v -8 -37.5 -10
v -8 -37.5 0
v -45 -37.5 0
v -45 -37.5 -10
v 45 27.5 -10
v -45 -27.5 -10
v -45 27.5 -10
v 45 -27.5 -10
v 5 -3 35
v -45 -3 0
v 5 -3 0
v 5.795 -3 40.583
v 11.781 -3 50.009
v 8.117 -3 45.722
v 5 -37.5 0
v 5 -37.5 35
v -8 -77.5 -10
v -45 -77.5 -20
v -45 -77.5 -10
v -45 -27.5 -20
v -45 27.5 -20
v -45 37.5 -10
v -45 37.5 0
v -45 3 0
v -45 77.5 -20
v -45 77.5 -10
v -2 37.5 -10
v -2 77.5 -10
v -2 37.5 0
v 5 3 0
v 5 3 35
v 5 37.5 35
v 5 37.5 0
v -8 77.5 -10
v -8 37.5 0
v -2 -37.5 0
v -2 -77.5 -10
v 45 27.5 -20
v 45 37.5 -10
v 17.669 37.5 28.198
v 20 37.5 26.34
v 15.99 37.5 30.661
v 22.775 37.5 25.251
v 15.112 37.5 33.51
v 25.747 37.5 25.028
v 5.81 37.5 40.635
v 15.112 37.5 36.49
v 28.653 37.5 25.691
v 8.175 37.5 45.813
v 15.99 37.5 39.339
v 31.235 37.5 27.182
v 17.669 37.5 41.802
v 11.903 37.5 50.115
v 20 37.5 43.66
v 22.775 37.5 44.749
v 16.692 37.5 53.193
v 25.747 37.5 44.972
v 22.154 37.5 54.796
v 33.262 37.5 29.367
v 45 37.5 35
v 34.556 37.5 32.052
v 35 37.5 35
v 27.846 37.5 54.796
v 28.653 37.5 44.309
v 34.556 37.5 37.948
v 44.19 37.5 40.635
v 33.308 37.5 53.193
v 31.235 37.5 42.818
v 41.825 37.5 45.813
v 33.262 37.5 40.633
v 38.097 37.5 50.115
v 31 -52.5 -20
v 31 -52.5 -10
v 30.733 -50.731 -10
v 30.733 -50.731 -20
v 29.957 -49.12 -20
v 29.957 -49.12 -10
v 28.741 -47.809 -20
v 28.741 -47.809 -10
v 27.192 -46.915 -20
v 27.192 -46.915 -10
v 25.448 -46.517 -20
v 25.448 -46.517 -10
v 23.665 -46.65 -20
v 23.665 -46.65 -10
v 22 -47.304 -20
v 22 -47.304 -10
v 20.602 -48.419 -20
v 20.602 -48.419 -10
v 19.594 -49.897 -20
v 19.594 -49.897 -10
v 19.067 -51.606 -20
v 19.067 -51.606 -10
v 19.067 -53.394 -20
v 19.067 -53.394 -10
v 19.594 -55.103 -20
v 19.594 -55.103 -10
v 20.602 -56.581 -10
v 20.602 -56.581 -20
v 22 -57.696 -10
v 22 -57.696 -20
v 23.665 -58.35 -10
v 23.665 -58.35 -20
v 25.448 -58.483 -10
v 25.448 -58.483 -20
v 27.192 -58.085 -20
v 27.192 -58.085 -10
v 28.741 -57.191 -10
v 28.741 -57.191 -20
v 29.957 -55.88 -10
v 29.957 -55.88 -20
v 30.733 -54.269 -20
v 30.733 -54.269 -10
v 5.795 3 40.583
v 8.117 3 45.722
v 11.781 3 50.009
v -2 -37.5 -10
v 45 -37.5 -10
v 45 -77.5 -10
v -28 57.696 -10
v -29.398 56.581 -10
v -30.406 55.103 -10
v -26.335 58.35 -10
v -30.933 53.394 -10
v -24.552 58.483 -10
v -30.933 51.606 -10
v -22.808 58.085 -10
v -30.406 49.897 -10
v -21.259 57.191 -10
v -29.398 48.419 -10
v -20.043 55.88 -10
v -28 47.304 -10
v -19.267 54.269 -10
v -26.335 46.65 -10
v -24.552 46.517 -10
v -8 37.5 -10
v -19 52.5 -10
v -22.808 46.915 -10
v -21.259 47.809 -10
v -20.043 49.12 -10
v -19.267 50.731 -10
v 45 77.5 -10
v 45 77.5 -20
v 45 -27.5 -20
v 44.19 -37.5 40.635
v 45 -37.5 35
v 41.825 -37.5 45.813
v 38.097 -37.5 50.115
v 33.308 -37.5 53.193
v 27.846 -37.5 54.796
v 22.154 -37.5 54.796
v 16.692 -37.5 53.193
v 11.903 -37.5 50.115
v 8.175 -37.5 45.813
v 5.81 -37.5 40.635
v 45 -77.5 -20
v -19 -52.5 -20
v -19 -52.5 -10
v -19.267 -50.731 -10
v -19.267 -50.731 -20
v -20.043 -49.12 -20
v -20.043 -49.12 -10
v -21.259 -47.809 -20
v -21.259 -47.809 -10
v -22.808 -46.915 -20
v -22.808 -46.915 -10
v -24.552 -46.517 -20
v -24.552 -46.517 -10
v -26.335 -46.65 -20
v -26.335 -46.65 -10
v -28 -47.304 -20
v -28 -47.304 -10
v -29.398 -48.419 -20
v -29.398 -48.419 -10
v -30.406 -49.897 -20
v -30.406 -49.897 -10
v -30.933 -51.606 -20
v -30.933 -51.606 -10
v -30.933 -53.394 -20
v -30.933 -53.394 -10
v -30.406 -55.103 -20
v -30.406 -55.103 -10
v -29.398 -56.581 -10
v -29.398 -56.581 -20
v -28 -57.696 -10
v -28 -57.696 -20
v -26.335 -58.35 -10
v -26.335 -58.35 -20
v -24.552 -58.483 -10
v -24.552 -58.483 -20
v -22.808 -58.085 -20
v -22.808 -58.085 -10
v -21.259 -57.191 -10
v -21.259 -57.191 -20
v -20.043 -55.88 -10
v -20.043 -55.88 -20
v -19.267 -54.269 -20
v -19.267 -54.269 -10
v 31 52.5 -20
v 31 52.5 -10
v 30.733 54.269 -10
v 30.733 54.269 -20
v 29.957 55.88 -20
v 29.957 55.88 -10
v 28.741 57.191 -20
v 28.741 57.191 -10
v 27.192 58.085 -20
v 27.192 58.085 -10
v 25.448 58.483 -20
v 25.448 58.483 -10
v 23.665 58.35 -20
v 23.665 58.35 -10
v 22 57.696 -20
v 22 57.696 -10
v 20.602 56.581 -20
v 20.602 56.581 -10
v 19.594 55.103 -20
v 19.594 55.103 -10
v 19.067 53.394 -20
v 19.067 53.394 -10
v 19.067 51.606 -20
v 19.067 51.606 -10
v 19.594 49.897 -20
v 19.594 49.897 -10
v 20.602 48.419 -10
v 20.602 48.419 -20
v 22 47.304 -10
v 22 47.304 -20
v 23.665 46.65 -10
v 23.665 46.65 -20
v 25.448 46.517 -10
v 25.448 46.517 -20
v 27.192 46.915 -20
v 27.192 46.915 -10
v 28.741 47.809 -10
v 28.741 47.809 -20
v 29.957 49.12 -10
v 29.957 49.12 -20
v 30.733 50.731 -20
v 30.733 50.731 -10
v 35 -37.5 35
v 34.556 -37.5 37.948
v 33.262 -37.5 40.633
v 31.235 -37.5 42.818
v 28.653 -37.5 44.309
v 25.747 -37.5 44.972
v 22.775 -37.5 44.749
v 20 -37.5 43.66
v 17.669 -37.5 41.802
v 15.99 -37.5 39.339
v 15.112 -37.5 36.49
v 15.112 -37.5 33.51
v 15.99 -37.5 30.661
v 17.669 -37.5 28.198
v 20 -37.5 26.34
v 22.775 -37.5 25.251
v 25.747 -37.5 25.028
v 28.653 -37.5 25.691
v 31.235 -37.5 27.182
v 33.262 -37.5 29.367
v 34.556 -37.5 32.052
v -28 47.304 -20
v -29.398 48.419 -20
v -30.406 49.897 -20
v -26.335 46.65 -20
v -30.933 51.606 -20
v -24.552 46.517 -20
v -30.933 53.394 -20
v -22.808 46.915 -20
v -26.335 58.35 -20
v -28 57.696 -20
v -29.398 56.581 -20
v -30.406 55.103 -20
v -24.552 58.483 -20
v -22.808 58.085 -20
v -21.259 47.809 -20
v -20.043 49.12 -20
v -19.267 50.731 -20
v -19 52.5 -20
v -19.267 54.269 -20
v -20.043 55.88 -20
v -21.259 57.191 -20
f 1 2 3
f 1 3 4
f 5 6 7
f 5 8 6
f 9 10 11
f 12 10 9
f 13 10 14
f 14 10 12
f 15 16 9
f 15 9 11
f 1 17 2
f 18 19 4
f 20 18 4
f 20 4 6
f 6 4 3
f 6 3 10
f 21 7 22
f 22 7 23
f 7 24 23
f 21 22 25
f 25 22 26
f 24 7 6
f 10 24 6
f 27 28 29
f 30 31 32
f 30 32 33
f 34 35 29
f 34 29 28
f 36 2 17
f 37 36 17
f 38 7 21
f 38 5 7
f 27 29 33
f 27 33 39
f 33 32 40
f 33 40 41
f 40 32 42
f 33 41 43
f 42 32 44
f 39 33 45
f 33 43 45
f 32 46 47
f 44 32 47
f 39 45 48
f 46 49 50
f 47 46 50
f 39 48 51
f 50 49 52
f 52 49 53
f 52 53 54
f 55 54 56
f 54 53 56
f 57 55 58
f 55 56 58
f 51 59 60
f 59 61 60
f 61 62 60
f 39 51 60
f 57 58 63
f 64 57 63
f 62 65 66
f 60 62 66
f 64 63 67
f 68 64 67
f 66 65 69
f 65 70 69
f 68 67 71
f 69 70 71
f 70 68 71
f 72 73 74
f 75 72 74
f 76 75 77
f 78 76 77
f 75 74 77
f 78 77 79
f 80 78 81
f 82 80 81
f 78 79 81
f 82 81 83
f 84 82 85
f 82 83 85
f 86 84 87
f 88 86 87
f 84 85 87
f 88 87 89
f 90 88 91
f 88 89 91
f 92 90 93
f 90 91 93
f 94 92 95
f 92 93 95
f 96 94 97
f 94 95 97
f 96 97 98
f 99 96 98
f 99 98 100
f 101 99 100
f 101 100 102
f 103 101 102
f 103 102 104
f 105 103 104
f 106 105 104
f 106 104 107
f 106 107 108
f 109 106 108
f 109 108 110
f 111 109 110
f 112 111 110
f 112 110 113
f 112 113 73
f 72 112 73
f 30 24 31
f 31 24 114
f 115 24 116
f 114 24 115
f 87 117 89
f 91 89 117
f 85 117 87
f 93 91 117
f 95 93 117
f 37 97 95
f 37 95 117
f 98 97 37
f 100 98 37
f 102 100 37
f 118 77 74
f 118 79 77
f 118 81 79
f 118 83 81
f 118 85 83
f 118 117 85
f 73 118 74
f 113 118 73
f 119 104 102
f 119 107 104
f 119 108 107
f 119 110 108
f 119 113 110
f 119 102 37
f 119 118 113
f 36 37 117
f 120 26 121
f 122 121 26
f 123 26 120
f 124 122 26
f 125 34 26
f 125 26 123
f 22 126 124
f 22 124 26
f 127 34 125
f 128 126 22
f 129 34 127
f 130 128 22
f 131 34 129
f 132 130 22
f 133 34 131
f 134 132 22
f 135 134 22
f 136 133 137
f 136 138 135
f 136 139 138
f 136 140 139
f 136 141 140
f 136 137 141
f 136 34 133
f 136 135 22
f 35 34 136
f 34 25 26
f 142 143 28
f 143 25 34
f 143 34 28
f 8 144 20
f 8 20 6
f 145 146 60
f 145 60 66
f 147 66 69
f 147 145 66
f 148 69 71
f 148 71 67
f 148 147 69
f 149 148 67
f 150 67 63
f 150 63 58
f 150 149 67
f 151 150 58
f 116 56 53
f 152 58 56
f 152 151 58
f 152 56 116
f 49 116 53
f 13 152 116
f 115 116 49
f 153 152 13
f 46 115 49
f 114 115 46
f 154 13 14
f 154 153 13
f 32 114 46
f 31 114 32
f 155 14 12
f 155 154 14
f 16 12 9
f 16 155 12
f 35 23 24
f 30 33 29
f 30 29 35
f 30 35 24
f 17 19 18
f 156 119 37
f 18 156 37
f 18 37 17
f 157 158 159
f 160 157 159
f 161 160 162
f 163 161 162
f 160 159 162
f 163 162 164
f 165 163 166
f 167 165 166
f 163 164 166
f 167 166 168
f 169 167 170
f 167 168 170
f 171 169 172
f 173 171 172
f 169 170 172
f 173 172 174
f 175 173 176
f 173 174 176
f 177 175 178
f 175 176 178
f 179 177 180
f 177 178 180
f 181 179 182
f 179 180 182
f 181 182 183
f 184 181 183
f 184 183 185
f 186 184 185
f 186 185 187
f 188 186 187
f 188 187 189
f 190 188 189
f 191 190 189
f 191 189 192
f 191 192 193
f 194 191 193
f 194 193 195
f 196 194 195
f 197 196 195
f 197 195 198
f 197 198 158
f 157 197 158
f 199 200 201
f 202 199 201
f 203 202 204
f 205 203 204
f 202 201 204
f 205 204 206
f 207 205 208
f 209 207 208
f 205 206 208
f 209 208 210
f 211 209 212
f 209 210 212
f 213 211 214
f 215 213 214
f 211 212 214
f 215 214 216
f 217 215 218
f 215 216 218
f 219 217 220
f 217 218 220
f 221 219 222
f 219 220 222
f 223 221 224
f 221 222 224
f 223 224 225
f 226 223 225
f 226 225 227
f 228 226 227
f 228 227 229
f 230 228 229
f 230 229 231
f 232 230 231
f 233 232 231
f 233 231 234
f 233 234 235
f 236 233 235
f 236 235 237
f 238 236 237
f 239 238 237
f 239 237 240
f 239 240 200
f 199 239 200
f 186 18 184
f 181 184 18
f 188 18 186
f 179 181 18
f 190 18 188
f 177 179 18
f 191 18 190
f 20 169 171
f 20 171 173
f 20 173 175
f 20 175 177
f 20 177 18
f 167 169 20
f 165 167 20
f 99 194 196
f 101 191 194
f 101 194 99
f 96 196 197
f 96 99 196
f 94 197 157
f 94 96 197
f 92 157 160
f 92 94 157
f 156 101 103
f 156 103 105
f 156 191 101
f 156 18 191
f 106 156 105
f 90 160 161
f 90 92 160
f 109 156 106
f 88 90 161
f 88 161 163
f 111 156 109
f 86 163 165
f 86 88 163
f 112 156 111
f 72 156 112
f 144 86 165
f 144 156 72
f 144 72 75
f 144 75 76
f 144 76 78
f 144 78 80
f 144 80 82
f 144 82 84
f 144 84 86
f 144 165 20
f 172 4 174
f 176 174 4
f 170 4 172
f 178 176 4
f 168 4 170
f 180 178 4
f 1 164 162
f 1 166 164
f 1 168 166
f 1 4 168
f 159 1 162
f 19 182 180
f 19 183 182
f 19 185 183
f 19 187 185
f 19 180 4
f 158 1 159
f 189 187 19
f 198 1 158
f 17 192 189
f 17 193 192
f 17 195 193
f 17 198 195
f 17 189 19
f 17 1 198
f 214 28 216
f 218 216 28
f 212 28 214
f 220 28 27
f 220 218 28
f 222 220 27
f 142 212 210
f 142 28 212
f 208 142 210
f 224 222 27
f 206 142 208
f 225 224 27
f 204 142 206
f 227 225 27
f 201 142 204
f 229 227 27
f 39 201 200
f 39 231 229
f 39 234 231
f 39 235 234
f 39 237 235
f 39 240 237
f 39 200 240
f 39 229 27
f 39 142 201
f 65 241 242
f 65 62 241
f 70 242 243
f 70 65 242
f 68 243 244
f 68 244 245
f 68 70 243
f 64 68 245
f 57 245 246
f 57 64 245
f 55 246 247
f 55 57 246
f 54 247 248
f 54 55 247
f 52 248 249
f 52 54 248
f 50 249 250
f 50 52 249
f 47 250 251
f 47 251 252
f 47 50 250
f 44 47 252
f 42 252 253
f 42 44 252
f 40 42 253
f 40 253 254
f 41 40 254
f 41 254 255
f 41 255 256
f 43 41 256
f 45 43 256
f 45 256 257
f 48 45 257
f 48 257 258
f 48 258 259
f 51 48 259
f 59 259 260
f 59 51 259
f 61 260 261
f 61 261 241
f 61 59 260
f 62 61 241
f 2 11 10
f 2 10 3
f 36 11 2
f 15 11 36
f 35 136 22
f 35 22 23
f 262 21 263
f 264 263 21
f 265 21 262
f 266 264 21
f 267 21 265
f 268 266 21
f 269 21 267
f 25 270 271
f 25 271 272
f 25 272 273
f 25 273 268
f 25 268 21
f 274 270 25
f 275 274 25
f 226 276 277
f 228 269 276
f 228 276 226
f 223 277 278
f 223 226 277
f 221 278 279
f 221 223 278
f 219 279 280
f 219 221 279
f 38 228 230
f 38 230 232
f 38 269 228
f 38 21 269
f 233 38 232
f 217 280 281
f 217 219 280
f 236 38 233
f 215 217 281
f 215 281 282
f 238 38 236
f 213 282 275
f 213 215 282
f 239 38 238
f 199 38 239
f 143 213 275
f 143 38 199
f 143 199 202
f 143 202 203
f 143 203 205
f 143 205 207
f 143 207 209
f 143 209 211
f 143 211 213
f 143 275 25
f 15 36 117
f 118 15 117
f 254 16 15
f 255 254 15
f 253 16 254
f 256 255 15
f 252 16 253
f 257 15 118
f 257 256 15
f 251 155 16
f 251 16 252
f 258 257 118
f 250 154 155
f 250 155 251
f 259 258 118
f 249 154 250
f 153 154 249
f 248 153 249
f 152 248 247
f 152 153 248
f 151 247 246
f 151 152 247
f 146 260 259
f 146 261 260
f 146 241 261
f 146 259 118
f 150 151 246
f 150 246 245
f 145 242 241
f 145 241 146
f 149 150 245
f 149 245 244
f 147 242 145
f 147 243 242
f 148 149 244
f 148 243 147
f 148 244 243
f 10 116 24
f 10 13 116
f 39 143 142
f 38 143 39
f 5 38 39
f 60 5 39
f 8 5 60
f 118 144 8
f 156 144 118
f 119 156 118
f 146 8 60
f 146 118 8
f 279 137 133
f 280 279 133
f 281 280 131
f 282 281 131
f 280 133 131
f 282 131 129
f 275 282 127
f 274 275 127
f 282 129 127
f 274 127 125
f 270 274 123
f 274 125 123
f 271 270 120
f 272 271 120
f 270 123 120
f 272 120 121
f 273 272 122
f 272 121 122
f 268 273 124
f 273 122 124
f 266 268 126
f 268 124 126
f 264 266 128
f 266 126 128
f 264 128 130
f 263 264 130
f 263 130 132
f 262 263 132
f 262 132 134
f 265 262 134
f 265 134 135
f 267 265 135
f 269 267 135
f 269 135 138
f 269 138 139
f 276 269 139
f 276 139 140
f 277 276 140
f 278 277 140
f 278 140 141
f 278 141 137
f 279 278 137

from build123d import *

# Parameters (mm, degrees)
F1_DEPTH  = 45
F2_R      = 6
F3_DEPTH  = 10.001
F6_DEPTH  = 6
F7_R      = 10
F8_DEPTH  = 37.5
F10_DEPTH = 3


# Not quite as in the source:
# - a pattern or mirror of a feature is missing from the dataset's text; its kind, count and spacing are read off the source's solid


with BuildPart() as f1:
    # F0 (on Right) → F1 (new body, symmetric)
    with BuildSketch(Plane.YZ):
        Polygon((27.5, -20), (77.5, -20), (77.5, -10), (37.5, -10), (37.5, 0), (-37.5, 0), (-37.5, -10), (-77.5, -10), (-77.5, -20), (-27.5, -20), (-27.5, -10), (27.5, -10), align=None)
    extrude(amount=F1_DEPTH, both=True)

    # F2 (on face) → F3 (cut, through all)
    with BuildSketch(Plane.XY.offset(-10)):
        with Locations((25, -52.5)):
            Circle(F2_R)
        with Locations((-25, -52.5)):
            Circle(F2_R)
        with Locations((-25, 52.5)):
            Circle(F2_R)
        with Locations((25, 52.5)):
            Circle(F2_R)
    extrude(amount=-F3_DEPTH, mode=Mode.SUBTRACT)

    # F5 (on offset) → F6 (join)
    with BuildSketch(Plane(origin=(-8, 0, 0), x_dir=(0, -1, 0), z_dir=(-1, 0, 0))):
        Polygon((-37.5, -10), (-37.5, 0), (-77.5, -10), align=None)
    f6 = extrude(amount=-F6_DEPTH)

    # F6_copies: F6 across plane
    add(f6.mirror(Plane(origin=(0, 0, 0), x_dir=(0, 0, -1), z_dir=(0, -1, 0))))

    # F7 (on Front) → F8 (join, symmetric)
    with BuildSketch(Plane.XZ):
        with BuildLine():
            Line((5, 0), (45, 0))
            Line((45, 0), (45, 35))
            ThreePointArc((45, 35), (25, 55), (5, 35))
            Line((5, 35), (5, 0))
        make_face()
        with Locations((25, 35)):
            Circle(F7_R, mode=Mode.SUBTRACT)
    extrude(amount=F8_DEPTH, both=True)

    # F9 (on Front) → F10 (join, symmetric)
    with BuildSketch(Plane.XZ):
        Polygon((11.7812880283, 50.0088525148), (-45, 0), (5, 0), align=None)
    extrude(amount=F10_DEPTH, both=True)


solid = f1.part
